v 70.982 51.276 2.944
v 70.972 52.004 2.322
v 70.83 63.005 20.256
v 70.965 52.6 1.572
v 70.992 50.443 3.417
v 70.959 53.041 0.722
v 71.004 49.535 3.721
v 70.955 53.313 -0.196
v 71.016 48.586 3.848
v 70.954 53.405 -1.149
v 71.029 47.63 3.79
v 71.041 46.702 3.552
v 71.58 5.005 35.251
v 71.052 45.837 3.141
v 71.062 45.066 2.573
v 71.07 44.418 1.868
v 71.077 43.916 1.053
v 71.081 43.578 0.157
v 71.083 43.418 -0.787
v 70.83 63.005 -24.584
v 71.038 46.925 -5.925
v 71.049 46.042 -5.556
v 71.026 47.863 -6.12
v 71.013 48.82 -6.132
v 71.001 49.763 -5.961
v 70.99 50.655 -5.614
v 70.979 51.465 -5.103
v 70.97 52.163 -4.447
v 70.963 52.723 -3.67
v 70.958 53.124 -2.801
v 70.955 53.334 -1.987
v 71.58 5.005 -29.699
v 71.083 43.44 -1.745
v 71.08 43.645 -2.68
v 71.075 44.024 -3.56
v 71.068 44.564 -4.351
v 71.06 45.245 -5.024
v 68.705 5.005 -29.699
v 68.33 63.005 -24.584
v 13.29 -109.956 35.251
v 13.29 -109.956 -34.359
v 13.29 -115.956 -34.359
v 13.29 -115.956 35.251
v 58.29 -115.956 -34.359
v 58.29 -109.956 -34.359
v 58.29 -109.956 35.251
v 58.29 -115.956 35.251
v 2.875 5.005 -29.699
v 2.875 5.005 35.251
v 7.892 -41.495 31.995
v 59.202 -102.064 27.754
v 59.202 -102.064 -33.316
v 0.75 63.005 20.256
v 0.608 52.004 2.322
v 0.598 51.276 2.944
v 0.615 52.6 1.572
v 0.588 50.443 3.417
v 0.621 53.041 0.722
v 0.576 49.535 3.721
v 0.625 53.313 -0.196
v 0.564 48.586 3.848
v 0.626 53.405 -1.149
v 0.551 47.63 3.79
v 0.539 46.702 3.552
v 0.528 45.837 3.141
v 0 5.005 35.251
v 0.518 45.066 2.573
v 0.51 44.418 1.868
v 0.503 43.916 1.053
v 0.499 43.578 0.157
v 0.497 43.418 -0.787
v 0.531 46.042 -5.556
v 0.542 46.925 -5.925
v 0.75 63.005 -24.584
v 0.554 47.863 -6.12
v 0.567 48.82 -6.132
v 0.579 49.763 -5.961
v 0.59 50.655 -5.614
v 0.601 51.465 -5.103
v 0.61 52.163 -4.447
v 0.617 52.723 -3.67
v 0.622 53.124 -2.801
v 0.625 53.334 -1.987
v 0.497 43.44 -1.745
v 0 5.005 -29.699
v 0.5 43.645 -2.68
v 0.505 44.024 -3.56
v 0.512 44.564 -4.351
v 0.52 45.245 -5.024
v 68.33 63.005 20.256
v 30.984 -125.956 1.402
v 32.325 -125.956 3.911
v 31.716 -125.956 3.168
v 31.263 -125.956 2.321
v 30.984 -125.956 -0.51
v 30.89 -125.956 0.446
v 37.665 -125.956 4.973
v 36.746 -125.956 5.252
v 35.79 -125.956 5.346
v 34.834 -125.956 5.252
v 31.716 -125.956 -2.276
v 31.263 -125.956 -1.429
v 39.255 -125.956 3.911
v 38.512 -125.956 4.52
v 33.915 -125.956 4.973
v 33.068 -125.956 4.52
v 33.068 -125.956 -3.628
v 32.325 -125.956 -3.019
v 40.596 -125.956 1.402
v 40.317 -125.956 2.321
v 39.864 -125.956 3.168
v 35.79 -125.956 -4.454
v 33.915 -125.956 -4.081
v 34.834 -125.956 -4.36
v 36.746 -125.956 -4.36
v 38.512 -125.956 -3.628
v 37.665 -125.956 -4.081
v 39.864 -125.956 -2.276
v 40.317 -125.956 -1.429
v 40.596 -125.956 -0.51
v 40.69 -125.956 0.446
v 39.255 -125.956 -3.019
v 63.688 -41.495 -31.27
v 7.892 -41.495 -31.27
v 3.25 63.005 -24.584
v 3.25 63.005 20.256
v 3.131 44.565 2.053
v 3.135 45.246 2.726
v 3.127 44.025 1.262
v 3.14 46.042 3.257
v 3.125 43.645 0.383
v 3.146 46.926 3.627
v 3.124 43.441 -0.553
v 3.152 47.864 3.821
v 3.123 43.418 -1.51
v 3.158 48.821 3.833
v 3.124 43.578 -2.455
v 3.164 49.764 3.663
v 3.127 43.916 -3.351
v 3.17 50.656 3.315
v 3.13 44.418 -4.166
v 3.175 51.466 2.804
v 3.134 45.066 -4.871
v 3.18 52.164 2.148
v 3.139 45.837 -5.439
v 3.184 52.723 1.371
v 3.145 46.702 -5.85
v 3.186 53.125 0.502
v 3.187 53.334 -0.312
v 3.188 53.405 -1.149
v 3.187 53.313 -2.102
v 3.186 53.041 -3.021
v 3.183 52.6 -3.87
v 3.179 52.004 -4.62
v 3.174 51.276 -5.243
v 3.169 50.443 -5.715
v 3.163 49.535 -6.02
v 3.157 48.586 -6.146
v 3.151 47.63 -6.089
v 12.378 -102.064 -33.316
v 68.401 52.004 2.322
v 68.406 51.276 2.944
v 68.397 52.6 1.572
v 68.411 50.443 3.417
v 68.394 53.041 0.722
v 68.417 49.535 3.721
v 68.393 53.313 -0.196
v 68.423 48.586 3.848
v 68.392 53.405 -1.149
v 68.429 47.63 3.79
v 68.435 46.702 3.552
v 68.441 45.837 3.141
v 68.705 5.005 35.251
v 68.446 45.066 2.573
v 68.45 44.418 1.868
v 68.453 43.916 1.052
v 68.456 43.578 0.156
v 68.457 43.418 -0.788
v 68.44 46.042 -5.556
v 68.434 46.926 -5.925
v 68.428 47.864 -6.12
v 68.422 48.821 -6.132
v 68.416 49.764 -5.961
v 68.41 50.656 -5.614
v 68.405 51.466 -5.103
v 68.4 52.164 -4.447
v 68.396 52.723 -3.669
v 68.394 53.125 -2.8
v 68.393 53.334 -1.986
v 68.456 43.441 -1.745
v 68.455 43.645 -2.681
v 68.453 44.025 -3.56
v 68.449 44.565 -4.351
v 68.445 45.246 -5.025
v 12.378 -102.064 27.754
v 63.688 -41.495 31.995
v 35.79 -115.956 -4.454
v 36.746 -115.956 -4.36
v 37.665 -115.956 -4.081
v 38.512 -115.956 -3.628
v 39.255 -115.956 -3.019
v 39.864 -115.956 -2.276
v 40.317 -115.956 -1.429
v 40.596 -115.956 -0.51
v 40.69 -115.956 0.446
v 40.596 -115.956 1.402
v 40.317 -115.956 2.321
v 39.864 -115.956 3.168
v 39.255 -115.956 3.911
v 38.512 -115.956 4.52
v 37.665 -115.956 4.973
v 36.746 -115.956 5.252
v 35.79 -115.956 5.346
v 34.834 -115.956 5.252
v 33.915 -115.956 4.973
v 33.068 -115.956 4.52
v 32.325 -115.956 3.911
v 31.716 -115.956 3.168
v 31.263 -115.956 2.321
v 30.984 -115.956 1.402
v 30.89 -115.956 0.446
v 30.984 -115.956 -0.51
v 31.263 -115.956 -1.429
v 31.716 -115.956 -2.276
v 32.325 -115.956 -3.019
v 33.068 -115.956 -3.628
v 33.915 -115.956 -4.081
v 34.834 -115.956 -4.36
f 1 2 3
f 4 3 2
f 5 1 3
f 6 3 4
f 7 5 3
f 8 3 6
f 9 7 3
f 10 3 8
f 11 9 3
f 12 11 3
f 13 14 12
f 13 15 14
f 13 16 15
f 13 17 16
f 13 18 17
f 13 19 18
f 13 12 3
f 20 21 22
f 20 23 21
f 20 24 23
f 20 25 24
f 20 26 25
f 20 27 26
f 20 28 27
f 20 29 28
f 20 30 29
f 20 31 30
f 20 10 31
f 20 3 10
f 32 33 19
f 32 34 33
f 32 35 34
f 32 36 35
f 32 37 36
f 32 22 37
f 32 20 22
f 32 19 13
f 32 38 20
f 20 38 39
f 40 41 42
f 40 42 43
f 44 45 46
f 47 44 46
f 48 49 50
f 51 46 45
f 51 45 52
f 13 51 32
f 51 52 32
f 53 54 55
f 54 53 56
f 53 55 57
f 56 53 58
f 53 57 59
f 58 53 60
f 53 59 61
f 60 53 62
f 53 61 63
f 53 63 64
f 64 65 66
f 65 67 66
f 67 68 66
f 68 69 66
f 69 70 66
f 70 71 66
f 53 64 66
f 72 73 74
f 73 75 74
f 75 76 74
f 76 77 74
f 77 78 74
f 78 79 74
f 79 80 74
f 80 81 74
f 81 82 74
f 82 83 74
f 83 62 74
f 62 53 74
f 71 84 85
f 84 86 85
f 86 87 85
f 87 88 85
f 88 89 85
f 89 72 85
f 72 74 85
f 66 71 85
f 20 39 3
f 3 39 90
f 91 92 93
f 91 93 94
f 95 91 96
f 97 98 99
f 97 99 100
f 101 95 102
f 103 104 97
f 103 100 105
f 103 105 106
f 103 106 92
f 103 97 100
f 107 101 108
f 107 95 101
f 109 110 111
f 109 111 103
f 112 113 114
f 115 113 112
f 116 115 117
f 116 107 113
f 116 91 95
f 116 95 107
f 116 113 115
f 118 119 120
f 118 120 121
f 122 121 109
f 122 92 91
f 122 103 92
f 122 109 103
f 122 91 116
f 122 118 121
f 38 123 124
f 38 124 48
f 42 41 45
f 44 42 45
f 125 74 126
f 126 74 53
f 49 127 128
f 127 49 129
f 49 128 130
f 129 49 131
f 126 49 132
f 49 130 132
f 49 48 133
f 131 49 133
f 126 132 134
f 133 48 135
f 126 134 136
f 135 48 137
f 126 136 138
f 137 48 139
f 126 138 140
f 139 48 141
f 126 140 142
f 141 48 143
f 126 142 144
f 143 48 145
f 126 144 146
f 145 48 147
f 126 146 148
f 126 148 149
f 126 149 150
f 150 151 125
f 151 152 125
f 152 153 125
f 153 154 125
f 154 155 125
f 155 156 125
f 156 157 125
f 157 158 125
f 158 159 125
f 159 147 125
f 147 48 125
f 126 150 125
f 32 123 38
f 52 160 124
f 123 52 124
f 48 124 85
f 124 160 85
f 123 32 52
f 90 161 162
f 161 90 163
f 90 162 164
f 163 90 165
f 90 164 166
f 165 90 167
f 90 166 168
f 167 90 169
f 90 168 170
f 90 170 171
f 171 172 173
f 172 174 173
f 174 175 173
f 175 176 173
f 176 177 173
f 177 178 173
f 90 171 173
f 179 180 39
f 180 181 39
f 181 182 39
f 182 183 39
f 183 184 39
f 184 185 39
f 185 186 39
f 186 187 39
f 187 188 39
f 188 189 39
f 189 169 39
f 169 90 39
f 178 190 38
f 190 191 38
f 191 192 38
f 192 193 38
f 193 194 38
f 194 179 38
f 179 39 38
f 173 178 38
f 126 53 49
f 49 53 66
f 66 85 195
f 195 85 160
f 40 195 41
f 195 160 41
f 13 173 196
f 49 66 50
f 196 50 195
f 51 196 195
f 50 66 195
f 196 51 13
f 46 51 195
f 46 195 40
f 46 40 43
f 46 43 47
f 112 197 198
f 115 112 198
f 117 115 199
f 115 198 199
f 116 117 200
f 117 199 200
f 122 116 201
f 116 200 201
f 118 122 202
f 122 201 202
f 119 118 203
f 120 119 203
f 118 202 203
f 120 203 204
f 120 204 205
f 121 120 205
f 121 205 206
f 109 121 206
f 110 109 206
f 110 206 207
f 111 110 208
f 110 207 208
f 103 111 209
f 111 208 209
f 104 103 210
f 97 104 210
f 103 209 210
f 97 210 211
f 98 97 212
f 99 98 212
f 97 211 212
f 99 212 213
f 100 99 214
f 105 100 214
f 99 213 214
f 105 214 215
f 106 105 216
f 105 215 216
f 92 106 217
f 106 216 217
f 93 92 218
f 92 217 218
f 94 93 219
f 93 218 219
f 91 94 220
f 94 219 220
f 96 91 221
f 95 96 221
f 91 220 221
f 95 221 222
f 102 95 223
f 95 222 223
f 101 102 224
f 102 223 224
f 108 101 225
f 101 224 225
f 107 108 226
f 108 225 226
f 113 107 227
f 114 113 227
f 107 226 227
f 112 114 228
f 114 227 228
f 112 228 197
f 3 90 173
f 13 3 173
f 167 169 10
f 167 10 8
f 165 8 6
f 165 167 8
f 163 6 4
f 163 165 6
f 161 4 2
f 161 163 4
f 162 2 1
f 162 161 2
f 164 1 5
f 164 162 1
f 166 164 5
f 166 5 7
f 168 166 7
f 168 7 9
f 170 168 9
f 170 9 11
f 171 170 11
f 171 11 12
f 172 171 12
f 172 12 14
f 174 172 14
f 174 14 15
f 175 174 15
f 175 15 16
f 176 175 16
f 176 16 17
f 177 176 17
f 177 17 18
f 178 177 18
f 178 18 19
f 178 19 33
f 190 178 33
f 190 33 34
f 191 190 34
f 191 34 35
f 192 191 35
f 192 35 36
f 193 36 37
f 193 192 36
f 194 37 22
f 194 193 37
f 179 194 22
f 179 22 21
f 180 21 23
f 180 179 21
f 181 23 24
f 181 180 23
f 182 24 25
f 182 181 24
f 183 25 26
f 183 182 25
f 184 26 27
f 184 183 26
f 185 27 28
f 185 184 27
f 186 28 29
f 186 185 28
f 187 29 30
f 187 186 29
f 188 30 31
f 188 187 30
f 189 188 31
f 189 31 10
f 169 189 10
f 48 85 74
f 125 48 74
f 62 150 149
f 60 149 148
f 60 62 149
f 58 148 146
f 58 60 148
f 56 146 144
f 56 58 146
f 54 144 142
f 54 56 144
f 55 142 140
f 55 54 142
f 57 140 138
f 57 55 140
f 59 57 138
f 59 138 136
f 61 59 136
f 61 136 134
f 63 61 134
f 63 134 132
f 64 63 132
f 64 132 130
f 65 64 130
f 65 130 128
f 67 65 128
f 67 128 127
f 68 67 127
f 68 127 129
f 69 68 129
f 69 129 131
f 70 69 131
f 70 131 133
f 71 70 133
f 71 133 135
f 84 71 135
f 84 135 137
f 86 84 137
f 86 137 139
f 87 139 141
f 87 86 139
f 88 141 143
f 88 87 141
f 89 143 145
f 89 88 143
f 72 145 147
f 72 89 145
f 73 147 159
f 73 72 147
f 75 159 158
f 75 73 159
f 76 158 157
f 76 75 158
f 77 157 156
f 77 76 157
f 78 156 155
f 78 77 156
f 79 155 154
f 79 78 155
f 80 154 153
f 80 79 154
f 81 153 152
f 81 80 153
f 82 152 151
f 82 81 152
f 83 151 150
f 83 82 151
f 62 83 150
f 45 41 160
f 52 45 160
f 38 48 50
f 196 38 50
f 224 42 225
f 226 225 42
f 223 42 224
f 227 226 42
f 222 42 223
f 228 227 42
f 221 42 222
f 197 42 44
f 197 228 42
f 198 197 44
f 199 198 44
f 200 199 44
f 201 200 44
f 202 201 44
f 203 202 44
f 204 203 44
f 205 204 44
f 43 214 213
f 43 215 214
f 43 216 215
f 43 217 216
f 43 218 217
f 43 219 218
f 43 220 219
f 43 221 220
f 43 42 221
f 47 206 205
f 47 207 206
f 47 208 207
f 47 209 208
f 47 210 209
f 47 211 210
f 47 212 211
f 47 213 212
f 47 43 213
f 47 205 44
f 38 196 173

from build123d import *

# Parameters (mm, degrees)
BOSS_EXTRUDE1_DEPTH             = 71.58
CUT_EXTRUDE2_DEPTH              = 136.85530183
CUT_EXTRUDE2_DEPTH_BACK         = 136.85530183
CUT_EXTRUDE3_DEPTH              = 136.85530183
CUT_EXTRUDE3_DEPTH_BACK         = 136.85530183
CUT_EXTRUDE4_DEPTH              = 136.85530183
CUT_EXTRUDE4_DEPTH_BACK         = 136.85530183
SKETCH16_R                      = 5
CUT_EXTRUDE11_DEPTH             = 136.85530183
SKETCH17_W                      = 45
SKETCH17_H                      = 69.61
BOSS_EXTRUDE2_DEPTH             = 6
SKETCH18_R                      = 4.9
BOSS_EXTRUDE3_DEPTH             = 10
CUT_EXTRUDE12_REACH             = 151.101
CUT_EXTRUDE12_DIRECTION_2_REACH = 151.101
BOSS_EXTRUDE4_REACH             = 150.692


with BuildPart() as part:
    # Sketch2 → Boss-Extrude1 (new body)
    with BuildSketch(Plane(origin=(0, 0, 0), x_dir=(0, 0, -1), z_dir=(1, 0, 0))):
        Polygon((-35.251160643, -109.956001694), (34.358839357, -109.956001694), (33.316287702, -102.063950804), (29.698839357, 5.004872941), (24.583736048, 63.004872941), (-20.256263952, 63.004872941), (-35.251160643, 5.004872941), (-27.753712298, -102.063950804), align=None)
    extrude(amount=BOSS_EXTRUDE1_DEPTH)

    # Sketch4 → Cut-Extrude2 (cut, two sides: drawn at the far end of the back side and taken through both)
    with BuildSketch(Plane.XY.offset(-CUT_EXTRUDE2_DEPTH_BACK)):
        Polygon((58.29, -109.956001694), (71.58, 5.004872941), (71.58, -109.956001694), align=None)
        Polygon((0, 5.004872941), (13.29, -109.956001694), (0, -109.956001694), align=None)
    extrude(amount=CUT_EXTRUDE2_DEPTH + CUT_EXTRUDE2_DEPTH_BACK, mode=Mode.SUBTRACT)

    # Sketch5 → Cut-Extrude3 (cut, two sides: drawn at the far end of the back side and taken through both)
    with BuildSketch(Plane.XY.offset(-CUT_EXTRUDE3_DEPTH_BACK)):
        Polygon((0, 5.004872941), (0, 63.004872941), (0.75, 63.004872941), align=None)
        Polygon((71.58, 63.004872941), (70.83, 63.004872941), (71.58, 5.004872941), align=None)
    extrude(amount=CUT_EXTRUDE3_DEPTH + CUT_EXTRUDE3_DEPTH_BACK, mode=Mode.SUBTRACT)

    # Sketch9 → Cut-Extrude4 (cut, two sides: drawn at the far end of the back side and taken through both)
    with BuildSketch(Plane.XY.offset(-CUT_EXTRUDE4_DEPTH_BACK)):
        Polygon((3.25, 63.004872941), (68.33, 63.004872941), (68.705, 5.004872941), (2.875, 5.004872941), align=None)
    extrude(amount=CUT_EXTRUDE4_DEPTH + CUT_EXTRUDE4_DEPTH_BACK, mode=Mode.SUBTRACT)

    # Sketch16 → Cut-Extrude11 (cut, through all)
    with BuildSketch(Plane(origin=(0, 0, 0), x_dir=(0, 0, -1), z_dir=(1, 0, 0))):
        with Locations(Location((1.149194348, 48.404872941, 0), (0, 0, 90))):
            Circle(SKETCH16_R)
    extrude(amount=CUT_EXTRUDE11_DEPTH, mode=Mode.SUBTRACT)

    # Sketch17 → Boss-Extrude2 (add)
    with BuildSketch(Plane.XZ.offset(109.956001694)):
        with Locations((35.79, 0.446160643)):
            Rectangle(SKETCH17_W, SKETCH17_H)
    extrude(amount=BOSS_EXTRUDE2_DEPTH)

    # Sketch18 → Boss-Extrude3 (add)
    with BuildSketch(Plane.XZ.offset(115.956001694)):
        with Locations(Location((35.79, 0.446160643, 0), (0, 0, 270))):
            Circle(SKETCH18_R)
    extrude(amount=BOSS_EXTRUDE3_DEPTH)

    # Cut-Extrude12: up to this plane
    cut_extrude12_end = Plane(origin=(71.58, -102.063950804, -33.316287702), z_dir=(0, -0.03376692966076465, 0.999429734629346))
    # Sketch19 → Cut-Extrude12 (cut, up to the surface)
    with BuildSketch(Plane.XY, mode=Mode.PRIVATE) as cut_extrude12_sk1:
        Polygon((2.875, 5.004872941), (7.892261572, -41.495127059), (63.687738428, -41.495127059), (68.705, 5.004872941), align=None)
    cut_extrude12_tool1 = split(extrude(cut_extrude12_sk1.sketch, amount=-CUT_EXTRUDE12_REACH, mode=Mode.PRIVATE), bisect_by=cut_extrude12_end, keep=Keep.BOTH, mode=Mode.PRIVATE)
    add(cut_extrude12_tool1.solids().sort_by_distance((35.79, -17.605725, 0))[0], mode=Mode.SUBTRACT)

    # Cut-Extrude12 direction 2: up to this plane
    cut_extrude12_direction_2_end = Plane(origin=(71.58, 5.004872941, 35.251160643), z_dir=(0, 0.06985351817200207, -0.9975572595089436))
    # Sketch19 → Cut-Extrude12 direction 2 (cut, up to the surface)
    with BuildSketch(Plane.XY, mode=Mode.PRIVATE) as cut_extrude12_direction_2_sk1:
        Polygon((2.875, 5.004872941), (7.892261572, -41.495127059), (63.687738428, -41.495127059), (68.705, 5.004872941), align=None)
    cut_extrude12_direction_2_tool1 = split(extrude(cut_extrude12_direction_2_sk1.sketch, amount=CUT_EXTRUDE12_DIRECTION_2_REACH, mode=Mode.PRIVATE), bisect_by=cut_extrude12_direction_2_end, keep=Keep.BOTH, mode=Mode.PRIVATE)
    add(cut_extrude12_direction_2_tool1.solids().sort_by_distance((35.79, -17.605725, 0))[0], mode=Mode.SUBTRACT)

    # Boss-Extrude4: up to this plane
    boss_extrude4_end = Plane(origin=(63.687738428, -41.495127059, -111.104129622), z_dir=(0.9942293381213047, -0.10727545487609211, 0))
    # Sketch20 → Boss-Extrude4 (add, up to the surface)
    with BuildSketch(Plane(origin=(3.375716186, 0.364233357, 0), x_dir=(0, 0, -1), z_dir=(0.9942293381213048, 0.10727545487609252, 0)), mode=Mode.PRIVATE) as boss_extrude4_sk1:
        Polygon((29.698839357, 4.667574579), (-31.995018137, -42.102318661), (31.269897506, -42.102318661), align=None)
    boss_extrude4_tool1 = split(extrude(boss_extrude4_sk1.sketch, amount=BOSS_EXTRUDE4_REACH, dir=(1, 0, 0), mode=Mode.PRIVATE), bisect_by=boss_extrude4_end, keep=Keep.BOTH, mode=Mode.PRIVATE)
    add(boss_extrude4_tool1.solids().sort_by_distance((6.219841, -25.995127, -9.657906))[0])


solid = part.part
